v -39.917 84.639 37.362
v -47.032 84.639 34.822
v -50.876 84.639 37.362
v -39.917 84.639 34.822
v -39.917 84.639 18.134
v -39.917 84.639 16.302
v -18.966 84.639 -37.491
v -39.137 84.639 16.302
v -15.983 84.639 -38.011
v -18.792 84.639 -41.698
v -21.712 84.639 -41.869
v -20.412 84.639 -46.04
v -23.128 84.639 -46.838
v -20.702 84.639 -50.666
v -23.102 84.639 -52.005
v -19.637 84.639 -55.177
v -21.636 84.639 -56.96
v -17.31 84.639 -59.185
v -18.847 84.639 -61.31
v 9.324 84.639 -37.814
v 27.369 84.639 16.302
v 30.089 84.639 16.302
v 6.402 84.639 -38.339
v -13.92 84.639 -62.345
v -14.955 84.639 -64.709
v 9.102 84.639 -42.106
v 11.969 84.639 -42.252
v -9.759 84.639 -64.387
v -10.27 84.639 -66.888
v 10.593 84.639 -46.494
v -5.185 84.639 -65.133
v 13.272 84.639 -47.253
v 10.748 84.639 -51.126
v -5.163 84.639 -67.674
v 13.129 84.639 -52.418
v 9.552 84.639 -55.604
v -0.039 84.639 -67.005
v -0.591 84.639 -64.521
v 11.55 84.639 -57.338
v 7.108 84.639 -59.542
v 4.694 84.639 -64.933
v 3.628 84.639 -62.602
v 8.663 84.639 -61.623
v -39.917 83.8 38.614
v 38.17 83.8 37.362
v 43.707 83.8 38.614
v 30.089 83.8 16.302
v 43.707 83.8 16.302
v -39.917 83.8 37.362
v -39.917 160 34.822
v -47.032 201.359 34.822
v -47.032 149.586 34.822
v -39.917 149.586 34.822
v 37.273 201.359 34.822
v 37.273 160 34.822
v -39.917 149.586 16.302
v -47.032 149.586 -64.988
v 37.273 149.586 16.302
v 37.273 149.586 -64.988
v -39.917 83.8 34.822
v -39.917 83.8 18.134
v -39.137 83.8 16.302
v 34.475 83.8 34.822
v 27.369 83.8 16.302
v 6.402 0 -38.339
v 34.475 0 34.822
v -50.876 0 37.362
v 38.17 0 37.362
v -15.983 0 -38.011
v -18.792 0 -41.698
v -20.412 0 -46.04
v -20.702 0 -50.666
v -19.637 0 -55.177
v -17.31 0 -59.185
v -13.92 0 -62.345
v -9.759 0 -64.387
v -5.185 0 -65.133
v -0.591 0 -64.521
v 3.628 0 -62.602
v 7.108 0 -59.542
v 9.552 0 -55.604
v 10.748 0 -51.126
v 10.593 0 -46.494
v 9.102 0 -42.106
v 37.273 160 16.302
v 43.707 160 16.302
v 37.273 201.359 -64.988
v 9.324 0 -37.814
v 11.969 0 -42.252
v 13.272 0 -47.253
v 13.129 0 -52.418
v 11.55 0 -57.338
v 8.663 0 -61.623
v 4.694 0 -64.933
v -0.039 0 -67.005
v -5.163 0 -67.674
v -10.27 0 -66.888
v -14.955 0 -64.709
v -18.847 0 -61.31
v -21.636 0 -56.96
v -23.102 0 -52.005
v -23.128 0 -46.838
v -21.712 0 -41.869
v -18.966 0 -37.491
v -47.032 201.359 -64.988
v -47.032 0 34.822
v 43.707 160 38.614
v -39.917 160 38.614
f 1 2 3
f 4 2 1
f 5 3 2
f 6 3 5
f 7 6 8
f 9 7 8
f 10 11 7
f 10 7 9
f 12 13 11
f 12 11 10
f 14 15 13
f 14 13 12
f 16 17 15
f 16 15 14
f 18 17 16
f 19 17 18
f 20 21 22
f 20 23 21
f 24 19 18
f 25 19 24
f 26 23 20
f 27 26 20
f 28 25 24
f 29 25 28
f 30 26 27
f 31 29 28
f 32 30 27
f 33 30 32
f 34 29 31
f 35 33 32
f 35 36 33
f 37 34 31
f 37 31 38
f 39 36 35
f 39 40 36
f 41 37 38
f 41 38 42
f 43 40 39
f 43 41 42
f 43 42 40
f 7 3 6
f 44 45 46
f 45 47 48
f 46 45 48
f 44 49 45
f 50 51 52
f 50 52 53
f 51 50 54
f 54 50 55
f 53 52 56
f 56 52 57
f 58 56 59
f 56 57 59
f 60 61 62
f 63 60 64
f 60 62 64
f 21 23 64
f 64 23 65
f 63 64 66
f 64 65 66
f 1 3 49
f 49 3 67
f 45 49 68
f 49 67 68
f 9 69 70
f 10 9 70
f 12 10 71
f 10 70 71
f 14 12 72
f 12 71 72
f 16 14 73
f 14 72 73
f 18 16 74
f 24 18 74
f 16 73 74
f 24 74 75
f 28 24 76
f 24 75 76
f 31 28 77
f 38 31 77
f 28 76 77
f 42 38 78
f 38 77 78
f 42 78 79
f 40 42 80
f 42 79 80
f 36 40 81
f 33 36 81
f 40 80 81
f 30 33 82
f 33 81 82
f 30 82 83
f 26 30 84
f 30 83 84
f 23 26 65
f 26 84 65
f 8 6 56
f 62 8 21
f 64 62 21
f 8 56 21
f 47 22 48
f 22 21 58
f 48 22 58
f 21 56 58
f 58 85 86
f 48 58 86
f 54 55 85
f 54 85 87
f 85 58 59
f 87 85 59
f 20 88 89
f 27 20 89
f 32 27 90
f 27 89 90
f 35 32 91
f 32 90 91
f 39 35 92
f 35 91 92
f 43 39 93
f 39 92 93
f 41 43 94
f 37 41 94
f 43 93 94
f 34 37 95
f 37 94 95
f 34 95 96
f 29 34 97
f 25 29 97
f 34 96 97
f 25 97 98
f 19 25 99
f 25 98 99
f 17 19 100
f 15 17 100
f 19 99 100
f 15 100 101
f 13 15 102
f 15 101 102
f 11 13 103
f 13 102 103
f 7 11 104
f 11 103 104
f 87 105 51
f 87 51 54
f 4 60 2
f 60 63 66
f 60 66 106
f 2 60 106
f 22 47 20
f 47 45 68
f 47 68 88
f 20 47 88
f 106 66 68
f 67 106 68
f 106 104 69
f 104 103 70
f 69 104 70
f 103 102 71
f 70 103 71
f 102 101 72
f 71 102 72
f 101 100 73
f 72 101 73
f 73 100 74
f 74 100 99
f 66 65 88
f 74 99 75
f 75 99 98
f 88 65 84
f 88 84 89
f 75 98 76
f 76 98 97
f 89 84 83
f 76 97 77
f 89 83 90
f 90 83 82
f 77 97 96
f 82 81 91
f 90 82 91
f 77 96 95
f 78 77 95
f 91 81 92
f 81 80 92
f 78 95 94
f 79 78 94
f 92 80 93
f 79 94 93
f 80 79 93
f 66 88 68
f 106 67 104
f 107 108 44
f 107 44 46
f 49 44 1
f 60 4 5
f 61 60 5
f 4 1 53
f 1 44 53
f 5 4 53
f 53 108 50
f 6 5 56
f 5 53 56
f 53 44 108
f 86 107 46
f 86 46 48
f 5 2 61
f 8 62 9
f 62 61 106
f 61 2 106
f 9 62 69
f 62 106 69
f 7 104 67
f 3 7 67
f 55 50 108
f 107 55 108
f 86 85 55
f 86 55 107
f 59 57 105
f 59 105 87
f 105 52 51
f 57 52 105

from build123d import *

# Parameters (mm, degrees)
LOFT_THIN1_DEPTH         = 84.63920117
BOSS_EXTRUDE1_DEPTH      = 41.359307983
BOSS_EXTRUDE1_DEPTH_BACK = 10.414
SKETCH8_W                = 84.304447576
SKETCH8_H                = 99.8104289
SKETCH16_W               = 83.624271947
SKETCH16_H               = 22.311451813
BOSS_EXTRUDE2_DEPTH      = 76.2


# Read off the part's stored shape, not the designer's step: Loft-Thin1
with BuildPart() as part:
    # Loft-Thin1 outline → Loft-Thin1 (new body)
    with BuildSketch(Plane(origin=(0, 0, 0), x_dir=(1, 0, 0), z_dir=(0, 1, 0))):
        with BuildLine():
            Line((38.170457439, -37.361978489), (9.323951838, 37.81376338))
            ThreePointArc((9.323951838, 37.81376338), (-5.162903092, 67.673974593), (-18.965674378, 37.491451765))
            Line((-18.965674378, 37.491451765), (-50.875746846, -37.361978489))
            Line((-50.875746846, -37.361978489), (38.170457439, -37.361978489))
        make_face()
        with BuildLine():
            ThreePointArc((-15.982812233, 38.011486845), (-5.185335077, 65.133470666), (6.401715759, 38.339296444))
            Line((6.401715759, 38.339296444), (34.475228233, -34.821978489))
            Line((34.475228233, -34.821978489), (-47.031772168, -34.821978489))
            Line((-47.031772168, -34.821978489), (-15.982812233, 38.011486845))
        make_face(mode=Mode.SUBTRACT)
    extrude(amount=LOFT_THIN1_DEPTH)



with BuildPart() as body_2:
    # Sketch8 → Boss-Extrude1 (new, two sides: drawn at the far end of the back side and taken through both)
    with BuildSketch(Plane(origin=(0, 160, 0), x_dir=(1, 0, 0), z_dir=(0, 1, 0)).offset(-BOSS_EXTRUDE1_DEPTH_BACK)):
        with Locations((-4.87954838, 15.083235961)):
            Rectangle(SKETCH8_W, SKETCH8_H)
    extrude(amount=BOSS_EXTRUDE1_DEPTH + BOSS_EXTRUDE1_DEPTH_BACK)


with BuildPart() as part_1:
    add(part.part)

    add(body_2.part)  # Boss-Extrude2 merges body 2
    # Sketch16 → Boss-Extrude2 (add)
    with BuildSketch(Plane(origin=(0, 160, 0), x_dir=(1, 0, 0), z_dir=(0, 1, 0))):
        with Locations((1.894665963, -27.457802507)):
            Rectangle(SKETCH16_W, SKETCH16_H)
    extrude(amount=-BOSS_EXTRUDE2_DEPTH)


solid = part_1.part
